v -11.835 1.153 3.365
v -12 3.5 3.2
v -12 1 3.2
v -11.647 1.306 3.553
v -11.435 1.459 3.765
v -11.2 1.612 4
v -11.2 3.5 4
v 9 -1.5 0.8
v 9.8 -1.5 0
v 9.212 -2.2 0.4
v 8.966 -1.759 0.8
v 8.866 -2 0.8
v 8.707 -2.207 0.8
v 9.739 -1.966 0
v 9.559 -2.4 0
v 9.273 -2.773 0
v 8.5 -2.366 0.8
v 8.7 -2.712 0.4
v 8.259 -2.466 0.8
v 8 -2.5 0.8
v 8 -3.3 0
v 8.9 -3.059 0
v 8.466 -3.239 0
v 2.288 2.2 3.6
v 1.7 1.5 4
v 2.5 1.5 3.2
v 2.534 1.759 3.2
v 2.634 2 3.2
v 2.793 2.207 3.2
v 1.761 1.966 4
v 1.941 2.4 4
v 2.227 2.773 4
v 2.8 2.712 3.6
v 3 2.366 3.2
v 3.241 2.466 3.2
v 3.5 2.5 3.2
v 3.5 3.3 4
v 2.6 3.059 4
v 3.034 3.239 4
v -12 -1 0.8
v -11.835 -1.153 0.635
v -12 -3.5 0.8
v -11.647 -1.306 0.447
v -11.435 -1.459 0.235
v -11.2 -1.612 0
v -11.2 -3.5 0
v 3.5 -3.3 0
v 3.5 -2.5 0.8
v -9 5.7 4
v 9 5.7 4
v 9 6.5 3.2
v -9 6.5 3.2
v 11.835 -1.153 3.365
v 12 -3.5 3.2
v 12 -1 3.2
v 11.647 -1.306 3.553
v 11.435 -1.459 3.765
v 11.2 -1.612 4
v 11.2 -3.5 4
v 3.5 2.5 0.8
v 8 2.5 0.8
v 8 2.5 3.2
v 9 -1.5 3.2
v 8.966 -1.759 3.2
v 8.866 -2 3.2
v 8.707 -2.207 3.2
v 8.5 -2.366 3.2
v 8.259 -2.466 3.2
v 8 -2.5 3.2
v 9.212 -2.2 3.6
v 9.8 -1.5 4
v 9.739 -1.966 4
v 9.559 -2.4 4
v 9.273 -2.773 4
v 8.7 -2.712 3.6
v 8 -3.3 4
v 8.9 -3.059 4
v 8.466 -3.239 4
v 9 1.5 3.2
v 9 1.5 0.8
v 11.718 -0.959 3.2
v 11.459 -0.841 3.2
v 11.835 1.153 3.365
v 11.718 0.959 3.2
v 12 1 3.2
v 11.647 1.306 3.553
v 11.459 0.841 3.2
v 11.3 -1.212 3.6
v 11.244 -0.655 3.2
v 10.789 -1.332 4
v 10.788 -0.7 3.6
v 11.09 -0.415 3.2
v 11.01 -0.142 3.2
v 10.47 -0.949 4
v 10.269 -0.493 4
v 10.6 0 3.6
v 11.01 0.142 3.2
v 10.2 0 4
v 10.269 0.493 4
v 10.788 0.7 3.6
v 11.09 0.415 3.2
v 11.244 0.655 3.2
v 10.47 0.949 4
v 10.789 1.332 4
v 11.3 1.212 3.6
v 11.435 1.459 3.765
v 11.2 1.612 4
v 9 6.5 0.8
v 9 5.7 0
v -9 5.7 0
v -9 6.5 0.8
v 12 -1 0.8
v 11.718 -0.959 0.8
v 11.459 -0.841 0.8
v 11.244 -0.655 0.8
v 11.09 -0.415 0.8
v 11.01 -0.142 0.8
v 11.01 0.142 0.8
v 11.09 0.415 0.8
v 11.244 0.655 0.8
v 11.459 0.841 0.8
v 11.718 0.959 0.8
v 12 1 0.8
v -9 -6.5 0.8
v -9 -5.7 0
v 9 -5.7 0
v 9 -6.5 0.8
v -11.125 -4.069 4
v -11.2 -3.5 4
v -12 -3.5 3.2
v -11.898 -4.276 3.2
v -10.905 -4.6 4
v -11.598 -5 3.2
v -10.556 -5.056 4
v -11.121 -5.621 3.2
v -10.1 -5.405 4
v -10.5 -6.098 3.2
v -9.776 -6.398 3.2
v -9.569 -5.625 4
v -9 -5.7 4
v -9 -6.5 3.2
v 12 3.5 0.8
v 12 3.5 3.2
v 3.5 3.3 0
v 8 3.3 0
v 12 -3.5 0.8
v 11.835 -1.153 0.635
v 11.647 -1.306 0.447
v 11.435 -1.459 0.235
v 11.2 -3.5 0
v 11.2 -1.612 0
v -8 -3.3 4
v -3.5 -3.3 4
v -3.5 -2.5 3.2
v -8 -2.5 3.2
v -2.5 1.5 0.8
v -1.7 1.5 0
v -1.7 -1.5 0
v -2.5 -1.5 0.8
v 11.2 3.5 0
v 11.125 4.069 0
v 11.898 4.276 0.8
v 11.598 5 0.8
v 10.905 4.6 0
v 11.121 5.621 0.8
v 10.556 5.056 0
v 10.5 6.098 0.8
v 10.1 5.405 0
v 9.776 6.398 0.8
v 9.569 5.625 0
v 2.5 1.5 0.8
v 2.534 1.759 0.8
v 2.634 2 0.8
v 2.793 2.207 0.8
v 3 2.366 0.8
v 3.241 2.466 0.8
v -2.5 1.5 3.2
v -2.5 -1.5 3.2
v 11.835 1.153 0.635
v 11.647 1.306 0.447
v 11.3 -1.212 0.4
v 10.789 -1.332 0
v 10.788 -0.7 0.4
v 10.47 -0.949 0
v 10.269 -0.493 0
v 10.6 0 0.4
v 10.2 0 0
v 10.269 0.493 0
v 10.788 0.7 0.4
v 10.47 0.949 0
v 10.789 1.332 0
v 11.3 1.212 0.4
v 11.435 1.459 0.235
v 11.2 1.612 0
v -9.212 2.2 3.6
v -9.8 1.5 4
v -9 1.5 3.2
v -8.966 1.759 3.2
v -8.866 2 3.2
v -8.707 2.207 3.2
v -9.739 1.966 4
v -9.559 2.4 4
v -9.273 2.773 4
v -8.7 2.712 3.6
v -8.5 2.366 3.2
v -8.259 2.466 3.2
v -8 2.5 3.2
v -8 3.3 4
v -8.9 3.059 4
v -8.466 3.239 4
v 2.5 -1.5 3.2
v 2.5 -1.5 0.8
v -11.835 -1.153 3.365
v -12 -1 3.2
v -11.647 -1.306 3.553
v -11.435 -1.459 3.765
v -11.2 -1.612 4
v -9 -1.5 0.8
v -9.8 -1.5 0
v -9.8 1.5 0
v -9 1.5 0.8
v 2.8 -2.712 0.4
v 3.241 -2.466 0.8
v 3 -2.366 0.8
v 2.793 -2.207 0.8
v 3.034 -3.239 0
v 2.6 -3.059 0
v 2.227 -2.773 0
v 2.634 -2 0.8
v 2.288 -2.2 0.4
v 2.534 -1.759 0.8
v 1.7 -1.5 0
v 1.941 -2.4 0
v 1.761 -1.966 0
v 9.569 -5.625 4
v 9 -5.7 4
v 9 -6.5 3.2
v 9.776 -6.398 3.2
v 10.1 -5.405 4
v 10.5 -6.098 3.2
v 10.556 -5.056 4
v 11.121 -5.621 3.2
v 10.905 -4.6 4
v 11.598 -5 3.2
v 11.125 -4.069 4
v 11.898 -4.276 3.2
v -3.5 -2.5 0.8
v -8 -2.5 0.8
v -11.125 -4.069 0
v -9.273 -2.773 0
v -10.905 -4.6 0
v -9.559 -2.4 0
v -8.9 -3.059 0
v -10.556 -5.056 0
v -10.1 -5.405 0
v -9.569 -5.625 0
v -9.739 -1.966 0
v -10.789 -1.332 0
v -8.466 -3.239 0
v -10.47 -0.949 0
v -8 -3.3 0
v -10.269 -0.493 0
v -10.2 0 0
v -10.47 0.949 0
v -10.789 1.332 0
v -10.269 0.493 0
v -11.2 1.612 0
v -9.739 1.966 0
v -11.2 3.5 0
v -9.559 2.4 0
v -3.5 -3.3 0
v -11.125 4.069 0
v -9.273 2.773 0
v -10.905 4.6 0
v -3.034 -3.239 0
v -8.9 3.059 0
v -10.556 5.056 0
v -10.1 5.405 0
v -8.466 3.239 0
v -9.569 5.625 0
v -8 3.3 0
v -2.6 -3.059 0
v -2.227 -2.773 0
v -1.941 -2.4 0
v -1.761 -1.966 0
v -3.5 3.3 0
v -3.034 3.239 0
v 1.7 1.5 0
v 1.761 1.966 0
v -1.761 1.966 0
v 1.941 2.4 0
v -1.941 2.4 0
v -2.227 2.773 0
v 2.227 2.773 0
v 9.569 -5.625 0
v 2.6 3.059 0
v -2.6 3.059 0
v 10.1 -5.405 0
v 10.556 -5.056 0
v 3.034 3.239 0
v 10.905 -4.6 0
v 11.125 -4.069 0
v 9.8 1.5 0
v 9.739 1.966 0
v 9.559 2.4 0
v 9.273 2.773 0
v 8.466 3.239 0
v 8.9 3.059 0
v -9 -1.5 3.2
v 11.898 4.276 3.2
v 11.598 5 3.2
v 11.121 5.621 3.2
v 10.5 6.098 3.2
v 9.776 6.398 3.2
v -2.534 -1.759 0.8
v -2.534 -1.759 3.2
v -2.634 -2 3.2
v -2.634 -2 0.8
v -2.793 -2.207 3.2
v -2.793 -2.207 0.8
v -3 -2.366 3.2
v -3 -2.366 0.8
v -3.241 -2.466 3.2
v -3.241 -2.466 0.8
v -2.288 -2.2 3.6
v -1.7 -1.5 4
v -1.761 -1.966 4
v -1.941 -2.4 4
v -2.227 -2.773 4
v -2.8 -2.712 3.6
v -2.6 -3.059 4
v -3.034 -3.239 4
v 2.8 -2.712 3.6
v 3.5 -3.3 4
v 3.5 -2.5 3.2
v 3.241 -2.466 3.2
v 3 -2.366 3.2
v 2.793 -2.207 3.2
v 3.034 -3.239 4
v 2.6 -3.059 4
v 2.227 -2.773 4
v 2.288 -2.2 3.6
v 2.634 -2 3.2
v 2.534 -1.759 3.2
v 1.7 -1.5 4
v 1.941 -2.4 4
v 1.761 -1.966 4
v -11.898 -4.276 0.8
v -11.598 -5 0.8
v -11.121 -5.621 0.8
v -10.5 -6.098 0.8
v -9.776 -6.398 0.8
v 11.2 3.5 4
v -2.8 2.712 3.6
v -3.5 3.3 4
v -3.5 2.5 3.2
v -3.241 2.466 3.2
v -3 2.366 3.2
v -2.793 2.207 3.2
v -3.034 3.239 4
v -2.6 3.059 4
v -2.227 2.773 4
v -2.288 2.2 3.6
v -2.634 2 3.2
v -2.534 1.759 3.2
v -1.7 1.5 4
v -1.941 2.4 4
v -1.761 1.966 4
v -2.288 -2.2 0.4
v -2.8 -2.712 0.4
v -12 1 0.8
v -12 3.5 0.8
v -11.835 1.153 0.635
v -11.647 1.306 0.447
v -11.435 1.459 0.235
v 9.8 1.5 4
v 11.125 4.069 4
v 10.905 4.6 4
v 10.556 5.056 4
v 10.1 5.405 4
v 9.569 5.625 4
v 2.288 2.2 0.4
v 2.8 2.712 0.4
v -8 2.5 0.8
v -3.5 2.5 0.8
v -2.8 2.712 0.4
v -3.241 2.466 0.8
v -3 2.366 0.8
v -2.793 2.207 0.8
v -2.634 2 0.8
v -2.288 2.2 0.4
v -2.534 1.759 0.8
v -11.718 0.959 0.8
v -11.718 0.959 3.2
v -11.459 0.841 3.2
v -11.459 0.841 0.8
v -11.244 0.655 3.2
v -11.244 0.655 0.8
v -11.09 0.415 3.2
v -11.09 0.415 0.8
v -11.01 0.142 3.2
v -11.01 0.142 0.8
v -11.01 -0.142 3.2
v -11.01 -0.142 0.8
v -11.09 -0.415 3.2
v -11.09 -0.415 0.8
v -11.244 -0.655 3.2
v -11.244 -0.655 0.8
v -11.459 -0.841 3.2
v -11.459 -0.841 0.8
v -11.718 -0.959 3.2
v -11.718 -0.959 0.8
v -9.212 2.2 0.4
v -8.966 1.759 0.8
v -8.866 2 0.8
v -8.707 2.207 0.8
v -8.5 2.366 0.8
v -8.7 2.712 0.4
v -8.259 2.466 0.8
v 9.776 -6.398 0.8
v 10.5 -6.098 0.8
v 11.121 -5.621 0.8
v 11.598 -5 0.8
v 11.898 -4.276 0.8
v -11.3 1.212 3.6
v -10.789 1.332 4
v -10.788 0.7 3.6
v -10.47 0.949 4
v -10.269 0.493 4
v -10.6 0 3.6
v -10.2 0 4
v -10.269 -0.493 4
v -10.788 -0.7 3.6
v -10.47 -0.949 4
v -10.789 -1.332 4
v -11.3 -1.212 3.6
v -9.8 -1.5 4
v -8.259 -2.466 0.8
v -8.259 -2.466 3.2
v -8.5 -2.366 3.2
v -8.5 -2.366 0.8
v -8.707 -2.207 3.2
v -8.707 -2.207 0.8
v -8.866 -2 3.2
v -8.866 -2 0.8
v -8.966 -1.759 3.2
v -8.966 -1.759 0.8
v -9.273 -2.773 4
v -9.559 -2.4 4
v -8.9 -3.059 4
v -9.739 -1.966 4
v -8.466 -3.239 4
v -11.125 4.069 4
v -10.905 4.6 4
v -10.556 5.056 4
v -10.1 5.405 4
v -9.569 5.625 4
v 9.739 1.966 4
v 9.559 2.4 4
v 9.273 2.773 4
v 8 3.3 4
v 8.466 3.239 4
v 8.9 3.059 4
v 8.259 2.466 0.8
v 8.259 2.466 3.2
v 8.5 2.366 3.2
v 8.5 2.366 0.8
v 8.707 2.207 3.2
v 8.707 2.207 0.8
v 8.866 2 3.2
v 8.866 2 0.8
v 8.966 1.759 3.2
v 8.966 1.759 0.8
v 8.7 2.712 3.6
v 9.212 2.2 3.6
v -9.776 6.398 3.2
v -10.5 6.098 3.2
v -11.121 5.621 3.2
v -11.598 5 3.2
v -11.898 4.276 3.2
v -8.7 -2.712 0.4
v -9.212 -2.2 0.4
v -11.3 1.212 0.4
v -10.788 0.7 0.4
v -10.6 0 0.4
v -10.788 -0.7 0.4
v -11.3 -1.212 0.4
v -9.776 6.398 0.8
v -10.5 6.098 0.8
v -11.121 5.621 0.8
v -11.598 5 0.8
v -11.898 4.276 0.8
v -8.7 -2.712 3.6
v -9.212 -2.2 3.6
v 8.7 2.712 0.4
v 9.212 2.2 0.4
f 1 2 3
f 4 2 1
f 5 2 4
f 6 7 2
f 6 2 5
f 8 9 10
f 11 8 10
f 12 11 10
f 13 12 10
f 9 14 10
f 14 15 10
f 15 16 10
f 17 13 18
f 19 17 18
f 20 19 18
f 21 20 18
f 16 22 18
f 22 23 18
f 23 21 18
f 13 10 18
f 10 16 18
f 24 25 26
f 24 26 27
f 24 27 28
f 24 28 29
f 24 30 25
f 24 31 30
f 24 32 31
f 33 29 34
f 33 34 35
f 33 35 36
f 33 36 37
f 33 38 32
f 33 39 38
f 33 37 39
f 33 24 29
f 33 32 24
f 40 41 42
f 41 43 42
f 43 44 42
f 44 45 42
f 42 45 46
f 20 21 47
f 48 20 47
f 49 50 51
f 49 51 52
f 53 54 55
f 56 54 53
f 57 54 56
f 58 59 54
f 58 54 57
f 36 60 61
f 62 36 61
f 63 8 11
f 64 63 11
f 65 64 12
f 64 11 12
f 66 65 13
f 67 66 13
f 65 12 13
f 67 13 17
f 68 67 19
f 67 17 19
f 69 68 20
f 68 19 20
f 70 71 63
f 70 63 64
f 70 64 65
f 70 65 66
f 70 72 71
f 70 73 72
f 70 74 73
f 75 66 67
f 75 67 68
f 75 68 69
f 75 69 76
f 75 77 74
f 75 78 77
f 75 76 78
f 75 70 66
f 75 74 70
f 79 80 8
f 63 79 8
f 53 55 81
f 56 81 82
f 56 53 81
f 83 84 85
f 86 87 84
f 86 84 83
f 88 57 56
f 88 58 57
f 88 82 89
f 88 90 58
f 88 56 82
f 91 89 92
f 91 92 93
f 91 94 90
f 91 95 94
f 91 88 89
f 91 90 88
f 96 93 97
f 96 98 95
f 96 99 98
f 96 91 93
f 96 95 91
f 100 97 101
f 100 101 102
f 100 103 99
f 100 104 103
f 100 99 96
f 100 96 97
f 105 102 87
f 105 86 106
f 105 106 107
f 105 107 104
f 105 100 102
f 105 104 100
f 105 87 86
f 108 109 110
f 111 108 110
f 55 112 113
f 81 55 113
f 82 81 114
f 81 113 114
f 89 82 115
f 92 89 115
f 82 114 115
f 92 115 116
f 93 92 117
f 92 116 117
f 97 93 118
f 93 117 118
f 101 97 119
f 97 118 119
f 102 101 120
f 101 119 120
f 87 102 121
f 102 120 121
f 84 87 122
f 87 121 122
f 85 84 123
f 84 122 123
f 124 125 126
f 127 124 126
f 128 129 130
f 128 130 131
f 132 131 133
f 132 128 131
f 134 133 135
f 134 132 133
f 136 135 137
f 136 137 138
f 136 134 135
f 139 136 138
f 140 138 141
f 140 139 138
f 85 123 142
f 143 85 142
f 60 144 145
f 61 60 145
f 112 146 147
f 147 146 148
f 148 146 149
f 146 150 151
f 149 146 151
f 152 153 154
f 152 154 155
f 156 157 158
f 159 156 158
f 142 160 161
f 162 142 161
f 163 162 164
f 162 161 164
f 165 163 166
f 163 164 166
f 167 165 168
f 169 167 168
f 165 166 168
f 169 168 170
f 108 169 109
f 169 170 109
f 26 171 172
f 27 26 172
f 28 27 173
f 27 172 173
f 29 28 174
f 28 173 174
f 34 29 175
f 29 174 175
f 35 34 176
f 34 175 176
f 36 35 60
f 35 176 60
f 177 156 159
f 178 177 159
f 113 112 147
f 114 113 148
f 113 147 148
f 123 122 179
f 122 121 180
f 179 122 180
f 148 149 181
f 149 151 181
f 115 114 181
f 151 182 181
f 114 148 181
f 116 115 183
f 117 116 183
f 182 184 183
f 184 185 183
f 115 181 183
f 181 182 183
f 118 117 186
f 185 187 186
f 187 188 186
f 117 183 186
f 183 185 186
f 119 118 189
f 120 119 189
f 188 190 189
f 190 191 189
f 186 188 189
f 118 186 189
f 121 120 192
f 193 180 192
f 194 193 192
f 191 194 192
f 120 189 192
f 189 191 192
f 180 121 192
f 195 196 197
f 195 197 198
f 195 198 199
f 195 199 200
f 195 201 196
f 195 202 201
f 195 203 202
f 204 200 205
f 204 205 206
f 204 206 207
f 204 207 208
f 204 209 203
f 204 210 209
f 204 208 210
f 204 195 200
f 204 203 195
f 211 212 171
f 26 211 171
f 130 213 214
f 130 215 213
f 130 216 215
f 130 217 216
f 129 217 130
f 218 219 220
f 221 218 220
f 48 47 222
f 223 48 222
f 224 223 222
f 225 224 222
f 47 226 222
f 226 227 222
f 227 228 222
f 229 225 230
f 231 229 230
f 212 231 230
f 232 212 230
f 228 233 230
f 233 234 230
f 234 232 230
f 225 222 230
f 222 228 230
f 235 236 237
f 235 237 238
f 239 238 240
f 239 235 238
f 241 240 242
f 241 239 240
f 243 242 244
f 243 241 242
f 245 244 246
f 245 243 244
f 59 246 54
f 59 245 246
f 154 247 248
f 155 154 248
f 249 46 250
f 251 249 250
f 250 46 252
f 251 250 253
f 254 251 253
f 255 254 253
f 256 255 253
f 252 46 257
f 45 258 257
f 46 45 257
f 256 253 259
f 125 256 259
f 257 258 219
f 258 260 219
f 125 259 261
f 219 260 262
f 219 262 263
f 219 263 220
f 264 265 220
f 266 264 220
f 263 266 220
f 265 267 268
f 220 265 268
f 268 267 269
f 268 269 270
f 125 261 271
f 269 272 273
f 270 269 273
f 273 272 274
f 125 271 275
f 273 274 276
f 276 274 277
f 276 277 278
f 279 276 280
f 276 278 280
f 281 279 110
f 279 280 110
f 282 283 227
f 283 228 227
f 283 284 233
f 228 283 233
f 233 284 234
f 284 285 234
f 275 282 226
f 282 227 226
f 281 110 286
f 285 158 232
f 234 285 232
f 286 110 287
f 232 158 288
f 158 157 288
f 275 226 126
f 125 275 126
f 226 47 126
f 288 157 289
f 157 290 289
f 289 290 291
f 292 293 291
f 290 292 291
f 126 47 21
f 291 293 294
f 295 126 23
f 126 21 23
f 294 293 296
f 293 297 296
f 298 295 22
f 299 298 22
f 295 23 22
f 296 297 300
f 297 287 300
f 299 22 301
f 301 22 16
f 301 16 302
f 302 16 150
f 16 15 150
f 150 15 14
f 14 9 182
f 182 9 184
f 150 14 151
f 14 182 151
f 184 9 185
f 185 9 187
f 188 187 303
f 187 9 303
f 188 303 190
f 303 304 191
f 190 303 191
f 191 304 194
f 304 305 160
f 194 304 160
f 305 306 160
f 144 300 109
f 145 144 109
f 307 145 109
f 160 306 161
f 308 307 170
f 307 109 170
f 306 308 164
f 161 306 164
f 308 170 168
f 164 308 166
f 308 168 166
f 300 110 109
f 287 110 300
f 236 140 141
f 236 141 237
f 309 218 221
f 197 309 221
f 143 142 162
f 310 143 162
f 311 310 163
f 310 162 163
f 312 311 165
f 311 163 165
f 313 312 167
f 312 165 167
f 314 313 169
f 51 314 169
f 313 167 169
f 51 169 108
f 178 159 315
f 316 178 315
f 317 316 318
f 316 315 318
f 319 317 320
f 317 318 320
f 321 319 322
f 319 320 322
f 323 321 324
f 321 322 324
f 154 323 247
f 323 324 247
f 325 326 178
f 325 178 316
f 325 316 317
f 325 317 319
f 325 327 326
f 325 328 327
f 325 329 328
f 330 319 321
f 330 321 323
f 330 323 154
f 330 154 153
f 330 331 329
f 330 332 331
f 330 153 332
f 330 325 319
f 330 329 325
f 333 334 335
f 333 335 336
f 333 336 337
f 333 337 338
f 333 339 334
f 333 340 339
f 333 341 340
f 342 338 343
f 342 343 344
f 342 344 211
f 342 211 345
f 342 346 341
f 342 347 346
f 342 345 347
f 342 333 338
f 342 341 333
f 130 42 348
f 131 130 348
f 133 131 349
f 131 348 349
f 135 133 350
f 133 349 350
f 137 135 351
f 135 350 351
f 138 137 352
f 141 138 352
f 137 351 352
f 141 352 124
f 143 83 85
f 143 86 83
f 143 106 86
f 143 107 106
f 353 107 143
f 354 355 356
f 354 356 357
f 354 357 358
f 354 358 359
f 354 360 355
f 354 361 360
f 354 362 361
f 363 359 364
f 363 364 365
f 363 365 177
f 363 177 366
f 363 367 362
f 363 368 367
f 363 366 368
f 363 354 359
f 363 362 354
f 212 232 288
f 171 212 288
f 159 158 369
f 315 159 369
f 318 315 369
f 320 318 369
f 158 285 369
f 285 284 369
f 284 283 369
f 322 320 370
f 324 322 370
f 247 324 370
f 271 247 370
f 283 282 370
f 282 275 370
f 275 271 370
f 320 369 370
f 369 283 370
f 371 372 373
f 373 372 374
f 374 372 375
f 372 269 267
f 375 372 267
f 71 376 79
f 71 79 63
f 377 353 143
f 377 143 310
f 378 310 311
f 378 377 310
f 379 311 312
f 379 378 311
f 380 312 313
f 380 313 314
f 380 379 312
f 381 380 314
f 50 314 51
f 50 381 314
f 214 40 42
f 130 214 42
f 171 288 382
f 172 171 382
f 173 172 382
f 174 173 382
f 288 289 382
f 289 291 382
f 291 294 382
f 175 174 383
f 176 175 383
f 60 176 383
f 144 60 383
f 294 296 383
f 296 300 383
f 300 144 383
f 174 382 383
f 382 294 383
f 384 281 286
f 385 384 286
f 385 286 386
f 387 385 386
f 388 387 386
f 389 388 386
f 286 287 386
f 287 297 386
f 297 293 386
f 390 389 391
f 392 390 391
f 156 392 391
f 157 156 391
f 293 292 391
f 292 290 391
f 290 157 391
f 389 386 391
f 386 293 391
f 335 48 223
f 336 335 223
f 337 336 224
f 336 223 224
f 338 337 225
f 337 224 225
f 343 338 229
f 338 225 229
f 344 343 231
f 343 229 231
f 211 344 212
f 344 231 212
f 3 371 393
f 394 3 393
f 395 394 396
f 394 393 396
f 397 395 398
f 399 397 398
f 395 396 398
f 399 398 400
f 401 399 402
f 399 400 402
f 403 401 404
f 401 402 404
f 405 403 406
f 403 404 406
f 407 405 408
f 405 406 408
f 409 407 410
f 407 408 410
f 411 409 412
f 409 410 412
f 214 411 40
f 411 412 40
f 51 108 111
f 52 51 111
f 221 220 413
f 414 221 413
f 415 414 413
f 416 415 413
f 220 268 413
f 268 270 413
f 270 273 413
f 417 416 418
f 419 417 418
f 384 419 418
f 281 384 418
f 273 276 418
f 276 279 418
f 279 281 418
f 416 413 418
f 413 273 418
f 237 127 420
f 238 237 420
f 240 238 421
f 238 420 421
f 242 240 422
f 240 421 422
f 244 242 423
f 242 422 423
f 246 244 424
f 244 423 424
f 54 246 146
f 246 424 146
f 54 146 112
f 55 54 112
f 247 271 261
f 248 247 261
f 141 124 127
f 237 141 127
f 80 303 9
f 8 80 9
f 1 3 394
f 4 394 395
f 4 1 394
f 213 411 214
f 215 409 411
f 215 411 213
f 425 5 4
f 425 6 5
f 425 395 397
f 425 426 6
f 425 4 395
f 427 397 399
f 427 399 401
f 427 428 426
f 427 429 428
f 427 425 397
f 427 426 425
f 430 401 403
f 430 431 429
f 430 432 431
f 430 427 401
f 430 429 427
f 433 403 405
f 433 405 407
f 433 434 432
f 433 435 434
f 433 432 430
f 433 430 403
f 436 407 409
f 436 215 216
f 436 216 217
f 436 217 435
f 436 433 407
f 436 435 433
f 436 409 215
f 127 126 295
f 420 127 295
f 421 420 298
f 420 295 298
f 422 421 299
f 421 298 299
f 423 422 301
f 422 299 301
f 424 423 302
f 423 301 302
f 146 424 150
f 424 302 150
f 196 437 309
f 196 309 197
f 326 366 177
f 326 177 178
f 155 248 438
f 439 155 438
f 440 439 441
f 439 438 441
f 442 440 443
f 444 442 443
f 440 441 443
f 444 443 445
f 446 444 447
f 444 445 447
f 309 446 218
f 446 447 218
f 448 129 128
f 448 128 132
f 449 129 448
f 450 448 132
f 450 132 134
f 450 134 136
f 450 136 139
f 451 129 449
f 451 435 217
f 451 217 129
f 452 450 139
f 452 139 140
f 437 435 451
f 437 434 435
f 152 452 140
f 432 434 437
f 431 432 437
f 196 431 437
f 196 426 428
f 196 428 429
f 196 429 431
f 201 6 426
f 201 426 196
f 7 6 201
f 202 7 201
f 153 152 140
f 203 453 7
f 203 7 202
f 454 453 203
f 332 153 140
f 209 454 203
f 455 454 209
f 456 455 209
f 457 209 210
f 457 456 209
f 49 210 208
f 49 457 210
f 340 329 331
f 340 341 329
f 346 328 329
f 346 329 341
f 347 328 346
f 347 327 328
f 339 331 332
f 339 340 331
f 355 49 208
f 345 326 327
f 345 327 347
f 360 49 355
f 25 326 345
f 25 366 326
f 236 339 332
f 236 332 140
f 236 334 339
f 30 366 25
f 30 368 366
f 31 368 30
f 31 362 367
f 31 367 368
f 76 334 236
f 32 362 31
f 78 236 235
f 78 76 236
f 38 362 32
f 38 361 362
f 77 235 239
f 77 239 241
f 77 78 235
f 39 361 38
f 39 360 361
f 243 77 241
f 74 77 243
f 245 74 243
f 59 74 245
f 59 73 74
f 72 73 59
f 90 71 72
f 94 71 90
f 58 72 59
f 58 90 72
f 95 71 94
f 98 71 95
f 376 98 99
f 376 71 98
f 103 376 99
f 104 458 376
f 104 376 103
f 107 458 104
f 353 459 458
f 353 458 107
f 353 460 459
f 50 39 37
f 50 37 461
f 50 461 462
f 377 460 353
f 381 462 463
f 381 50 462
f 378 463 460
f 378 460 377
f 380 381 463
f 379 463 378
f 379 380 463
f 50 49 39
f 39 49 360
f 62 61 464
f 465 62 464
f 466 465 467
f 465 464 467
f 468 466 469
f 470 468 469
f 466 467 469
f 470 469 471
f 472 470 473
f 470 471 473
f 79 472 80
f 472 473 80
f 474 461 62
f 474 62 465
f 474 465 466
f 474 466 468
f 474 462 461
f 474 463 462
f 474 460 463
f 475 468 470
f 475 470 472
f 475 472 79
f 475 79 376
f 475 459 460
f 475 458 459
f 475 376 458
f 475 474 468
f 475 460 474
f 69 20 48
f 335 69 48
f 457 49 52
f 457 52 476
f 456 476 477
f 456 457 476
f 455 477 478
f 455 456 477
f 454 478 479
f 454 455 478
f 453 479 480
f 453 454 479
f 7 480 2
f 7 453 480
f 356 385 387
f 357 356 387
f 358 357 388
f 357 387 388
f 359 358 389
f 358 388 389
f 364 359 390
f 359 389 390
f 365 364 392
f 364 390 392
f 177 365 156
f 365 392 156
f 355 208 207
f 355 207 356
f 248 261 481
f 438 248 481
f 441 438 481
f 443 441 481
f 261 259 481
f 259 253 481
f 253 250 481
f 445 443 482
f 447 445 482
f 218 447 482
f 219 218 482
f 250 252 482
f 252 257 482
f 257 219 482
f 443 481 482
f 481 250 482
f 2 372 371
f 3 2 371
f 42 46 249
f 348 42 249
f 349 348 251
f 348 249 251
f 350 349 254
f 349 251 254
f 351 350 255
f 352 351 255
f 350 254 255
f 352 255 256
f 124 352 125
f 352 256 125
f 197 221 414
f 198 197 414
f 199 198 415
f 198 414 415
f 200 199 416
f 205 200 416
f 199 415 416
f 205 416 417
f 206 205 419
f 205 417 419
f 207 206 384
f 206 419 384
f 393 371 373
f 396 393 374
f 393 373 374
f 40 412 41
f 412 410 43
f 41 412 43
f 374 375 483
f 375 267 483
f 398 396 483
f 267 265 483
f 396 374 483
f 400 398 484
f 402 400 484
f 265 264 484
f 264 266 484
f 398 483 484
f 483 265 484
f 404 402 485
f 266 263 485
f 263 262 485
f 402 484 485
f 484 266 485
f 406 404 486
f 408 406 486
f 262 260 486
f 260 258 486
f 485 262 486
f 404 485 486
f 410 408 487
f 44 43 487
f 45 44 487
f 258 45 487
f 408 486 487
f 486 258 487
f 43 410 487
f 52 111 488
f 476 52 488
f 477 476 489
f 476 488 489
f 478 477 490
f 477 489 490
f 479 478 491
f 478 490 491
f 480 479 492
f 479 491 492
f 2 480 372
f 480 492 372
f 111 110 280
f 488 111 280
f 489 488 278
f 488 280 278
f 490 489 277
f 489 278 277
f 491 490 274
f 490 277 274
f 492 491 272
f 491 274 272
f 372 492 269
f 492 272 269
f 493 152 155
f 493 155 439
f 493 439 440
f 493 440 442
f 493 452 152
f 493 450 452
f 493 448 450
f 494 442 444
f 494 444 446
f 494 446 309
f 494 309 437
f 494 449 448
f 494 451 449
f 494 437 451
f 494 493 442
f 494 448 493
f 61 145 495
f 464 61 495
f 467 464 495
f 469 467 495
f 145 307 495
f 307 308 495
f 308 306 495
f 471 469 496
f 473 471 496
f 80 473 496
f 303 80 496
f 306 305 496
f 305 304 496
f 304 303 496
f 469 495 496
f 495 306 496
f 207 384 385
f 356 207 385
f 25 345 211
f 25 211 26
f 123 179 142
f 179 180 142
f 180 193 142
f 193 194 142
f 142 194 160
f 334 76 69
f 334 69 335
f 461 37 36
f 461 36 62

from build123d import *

# Parameters (mm, degrees)
F1_DEPTH = 4
F2_SIZE  = 0.8


with BuildPart() as f1:
    # F0 (on Top) → F1 (new body)
    with BuildSketch(Plane.XY):
        with BuildLine():
            Line((9, 6.5), (-9, 6.5))
            ThreePointArc((-9, 6.5), (-11.12132, 5.62132), (-12, 3.5))
            Line((-12, 3.5), (-12, 1))
            ThreePointArc((-12, 1), (-11, 0), (-12, -1))
            Line((-12, -1), (-12, -3.5))
            ThreePointArc((-12, -3.5), (-11.12132, -5.62132), (-9, -6.5))
            Line((-9, -6.5), (9, -6.5))
            ThreePointArc((9, -6.5), (11.12132, -5.62132), (12, -3.5))
            Line((12, -3.5), (12, -1))
            ThreePointArc((12, -1), (11, 0), (12, 1))
            Line((12, 1), (12, 3.5))
            ThreePointArc((12, 3.5), (11.12132, 5.62132), (9, 6.5))
        make_face()
        with BuildLine():
            ThreePointArc((-9, 1.5), (-8.707107, 2.207107), (-8, 2.5))
            Line((-8, 2.5), (-3.5, 2.5))
            ThreePointArc((-3.5, 2.5), (-2.792893, 2.207107), (-2.5, 1.5))
            Line((-2.5, 1.5), (-2.5, -1.5))
            ThreePointArc((-2.5, -1.5), (-2.792893, -2.207107), (-3.5, -2.5))
            Line((-3.5, -2.5), (-8, -2.5))
            ThreePointArc((-8, -2.5), (-8.707107, -2.207107), (-9, -1.5))
            Line((-9, -1.5), (-9, 1.5))
        make_face(mode=Mode.SUBTRACT)
        with BuildLine():
            Line((8, -2.5), (3.5, -2.5))
            ThreePointArc((3.5, -2.5), (2.792893, -2.207107), (2.5, -1.5))
            Line((2.5, -1.5), (2.5, 1.5))
            ThreePointArc((2.5, 1.5), (2.792893, 2.207107), (3.5, 2.5))
            Line((3.5, 2.5), (8, 2.5))
            ThreePointArc((8, 2.5), (8.707107, 2.207107), (9, 1.5))
            Line((9, 1.5), (9, -1.5))
            ThreePointArc((9, -1.5), (8.707107, -2.207107), (8, -2.5))
        make_face(mode=Mode.SUBTRACT)
    extrude(amount=F1_DEPTH)

    # F2
    f2_edges = [f1.edges().sort_by_distance(p)[0] for p in [
        (0, 6.5, 4),
        (-11.12132, 5.62132, 4),
        (-12, 2.25, 4),
        (-11, 0, 4),
        (-12, -2.25, 4),
        (-11.12132, -5.62132, 4),
        (0, -6.5, 4),
        (11.12132, -5.62132, 4),
        (12, -2.25, 4),
        (11, 0, 4),
        (12, 2.25, 4),
        (11.12132, 5.62132, 4),
        (-8.707107, -2.207107, 4),
        (-9, 0, 4),
        (-8.707107, 2.207107, 4),
        (-5.75, 2.5, 4),
        (-2.792893, 2.207107, 4),
        (-2.5, 0, 4),
        (-2.792893, -2.207107, 4),
        (-5.75, -2.5, 4),
        (5.75, -2.5, 4),
        (2.792893, -2.207107, 4),
        (2.5, 0, 4),
        (2.792893, 2.207107, 4),
        (5.75, 2.5, 4),
        (8.707107, 2.207107, 4),
        (9, 0, 4),
        (8.707107, -2.207107, 4),
        (0, 6.5, 0),
        (-11.12132, 5.62132, 0),
        (-12, 2.25, 0),
        (-11, 0, 0),
        (-12, -2.25, 0),
        (-11.12132, -5.62132, 0),
        (0, -6.5, 0),
        (11.12132, -5.62132, 0),
        (12, -2.25, 0),
        (11, 0, 0),
        (12, 2.25, 0),
        (11.12132, 5.62132, 0),
        (-8.707107, -2.207107, 0),
        (-9, 0, 0),
        (-8.707107, 2.207107, 0),
        (-5.75, 2.5, 0),
        (-2.792893, 2.207107, 0),
        (-2.5, 0, 0),
        (-2.792893, -2.207107, 0),
        (-5.75, -2.5, 0),
        (5.75, -2.5, 0),
        (2.792893, -2.207107, 0),
        (2.5, 0, 0),
        (2.792893, 2.207107, 0),
        (5.75, 2.5, 0),
        (8.707107, 2.207107, 0),
        (9, 0, 0),
        (8.707107, -2.207107, 0),
    ]]
    chamfer(f2_edges, length=F2_SIZE)


solid = f1.part
